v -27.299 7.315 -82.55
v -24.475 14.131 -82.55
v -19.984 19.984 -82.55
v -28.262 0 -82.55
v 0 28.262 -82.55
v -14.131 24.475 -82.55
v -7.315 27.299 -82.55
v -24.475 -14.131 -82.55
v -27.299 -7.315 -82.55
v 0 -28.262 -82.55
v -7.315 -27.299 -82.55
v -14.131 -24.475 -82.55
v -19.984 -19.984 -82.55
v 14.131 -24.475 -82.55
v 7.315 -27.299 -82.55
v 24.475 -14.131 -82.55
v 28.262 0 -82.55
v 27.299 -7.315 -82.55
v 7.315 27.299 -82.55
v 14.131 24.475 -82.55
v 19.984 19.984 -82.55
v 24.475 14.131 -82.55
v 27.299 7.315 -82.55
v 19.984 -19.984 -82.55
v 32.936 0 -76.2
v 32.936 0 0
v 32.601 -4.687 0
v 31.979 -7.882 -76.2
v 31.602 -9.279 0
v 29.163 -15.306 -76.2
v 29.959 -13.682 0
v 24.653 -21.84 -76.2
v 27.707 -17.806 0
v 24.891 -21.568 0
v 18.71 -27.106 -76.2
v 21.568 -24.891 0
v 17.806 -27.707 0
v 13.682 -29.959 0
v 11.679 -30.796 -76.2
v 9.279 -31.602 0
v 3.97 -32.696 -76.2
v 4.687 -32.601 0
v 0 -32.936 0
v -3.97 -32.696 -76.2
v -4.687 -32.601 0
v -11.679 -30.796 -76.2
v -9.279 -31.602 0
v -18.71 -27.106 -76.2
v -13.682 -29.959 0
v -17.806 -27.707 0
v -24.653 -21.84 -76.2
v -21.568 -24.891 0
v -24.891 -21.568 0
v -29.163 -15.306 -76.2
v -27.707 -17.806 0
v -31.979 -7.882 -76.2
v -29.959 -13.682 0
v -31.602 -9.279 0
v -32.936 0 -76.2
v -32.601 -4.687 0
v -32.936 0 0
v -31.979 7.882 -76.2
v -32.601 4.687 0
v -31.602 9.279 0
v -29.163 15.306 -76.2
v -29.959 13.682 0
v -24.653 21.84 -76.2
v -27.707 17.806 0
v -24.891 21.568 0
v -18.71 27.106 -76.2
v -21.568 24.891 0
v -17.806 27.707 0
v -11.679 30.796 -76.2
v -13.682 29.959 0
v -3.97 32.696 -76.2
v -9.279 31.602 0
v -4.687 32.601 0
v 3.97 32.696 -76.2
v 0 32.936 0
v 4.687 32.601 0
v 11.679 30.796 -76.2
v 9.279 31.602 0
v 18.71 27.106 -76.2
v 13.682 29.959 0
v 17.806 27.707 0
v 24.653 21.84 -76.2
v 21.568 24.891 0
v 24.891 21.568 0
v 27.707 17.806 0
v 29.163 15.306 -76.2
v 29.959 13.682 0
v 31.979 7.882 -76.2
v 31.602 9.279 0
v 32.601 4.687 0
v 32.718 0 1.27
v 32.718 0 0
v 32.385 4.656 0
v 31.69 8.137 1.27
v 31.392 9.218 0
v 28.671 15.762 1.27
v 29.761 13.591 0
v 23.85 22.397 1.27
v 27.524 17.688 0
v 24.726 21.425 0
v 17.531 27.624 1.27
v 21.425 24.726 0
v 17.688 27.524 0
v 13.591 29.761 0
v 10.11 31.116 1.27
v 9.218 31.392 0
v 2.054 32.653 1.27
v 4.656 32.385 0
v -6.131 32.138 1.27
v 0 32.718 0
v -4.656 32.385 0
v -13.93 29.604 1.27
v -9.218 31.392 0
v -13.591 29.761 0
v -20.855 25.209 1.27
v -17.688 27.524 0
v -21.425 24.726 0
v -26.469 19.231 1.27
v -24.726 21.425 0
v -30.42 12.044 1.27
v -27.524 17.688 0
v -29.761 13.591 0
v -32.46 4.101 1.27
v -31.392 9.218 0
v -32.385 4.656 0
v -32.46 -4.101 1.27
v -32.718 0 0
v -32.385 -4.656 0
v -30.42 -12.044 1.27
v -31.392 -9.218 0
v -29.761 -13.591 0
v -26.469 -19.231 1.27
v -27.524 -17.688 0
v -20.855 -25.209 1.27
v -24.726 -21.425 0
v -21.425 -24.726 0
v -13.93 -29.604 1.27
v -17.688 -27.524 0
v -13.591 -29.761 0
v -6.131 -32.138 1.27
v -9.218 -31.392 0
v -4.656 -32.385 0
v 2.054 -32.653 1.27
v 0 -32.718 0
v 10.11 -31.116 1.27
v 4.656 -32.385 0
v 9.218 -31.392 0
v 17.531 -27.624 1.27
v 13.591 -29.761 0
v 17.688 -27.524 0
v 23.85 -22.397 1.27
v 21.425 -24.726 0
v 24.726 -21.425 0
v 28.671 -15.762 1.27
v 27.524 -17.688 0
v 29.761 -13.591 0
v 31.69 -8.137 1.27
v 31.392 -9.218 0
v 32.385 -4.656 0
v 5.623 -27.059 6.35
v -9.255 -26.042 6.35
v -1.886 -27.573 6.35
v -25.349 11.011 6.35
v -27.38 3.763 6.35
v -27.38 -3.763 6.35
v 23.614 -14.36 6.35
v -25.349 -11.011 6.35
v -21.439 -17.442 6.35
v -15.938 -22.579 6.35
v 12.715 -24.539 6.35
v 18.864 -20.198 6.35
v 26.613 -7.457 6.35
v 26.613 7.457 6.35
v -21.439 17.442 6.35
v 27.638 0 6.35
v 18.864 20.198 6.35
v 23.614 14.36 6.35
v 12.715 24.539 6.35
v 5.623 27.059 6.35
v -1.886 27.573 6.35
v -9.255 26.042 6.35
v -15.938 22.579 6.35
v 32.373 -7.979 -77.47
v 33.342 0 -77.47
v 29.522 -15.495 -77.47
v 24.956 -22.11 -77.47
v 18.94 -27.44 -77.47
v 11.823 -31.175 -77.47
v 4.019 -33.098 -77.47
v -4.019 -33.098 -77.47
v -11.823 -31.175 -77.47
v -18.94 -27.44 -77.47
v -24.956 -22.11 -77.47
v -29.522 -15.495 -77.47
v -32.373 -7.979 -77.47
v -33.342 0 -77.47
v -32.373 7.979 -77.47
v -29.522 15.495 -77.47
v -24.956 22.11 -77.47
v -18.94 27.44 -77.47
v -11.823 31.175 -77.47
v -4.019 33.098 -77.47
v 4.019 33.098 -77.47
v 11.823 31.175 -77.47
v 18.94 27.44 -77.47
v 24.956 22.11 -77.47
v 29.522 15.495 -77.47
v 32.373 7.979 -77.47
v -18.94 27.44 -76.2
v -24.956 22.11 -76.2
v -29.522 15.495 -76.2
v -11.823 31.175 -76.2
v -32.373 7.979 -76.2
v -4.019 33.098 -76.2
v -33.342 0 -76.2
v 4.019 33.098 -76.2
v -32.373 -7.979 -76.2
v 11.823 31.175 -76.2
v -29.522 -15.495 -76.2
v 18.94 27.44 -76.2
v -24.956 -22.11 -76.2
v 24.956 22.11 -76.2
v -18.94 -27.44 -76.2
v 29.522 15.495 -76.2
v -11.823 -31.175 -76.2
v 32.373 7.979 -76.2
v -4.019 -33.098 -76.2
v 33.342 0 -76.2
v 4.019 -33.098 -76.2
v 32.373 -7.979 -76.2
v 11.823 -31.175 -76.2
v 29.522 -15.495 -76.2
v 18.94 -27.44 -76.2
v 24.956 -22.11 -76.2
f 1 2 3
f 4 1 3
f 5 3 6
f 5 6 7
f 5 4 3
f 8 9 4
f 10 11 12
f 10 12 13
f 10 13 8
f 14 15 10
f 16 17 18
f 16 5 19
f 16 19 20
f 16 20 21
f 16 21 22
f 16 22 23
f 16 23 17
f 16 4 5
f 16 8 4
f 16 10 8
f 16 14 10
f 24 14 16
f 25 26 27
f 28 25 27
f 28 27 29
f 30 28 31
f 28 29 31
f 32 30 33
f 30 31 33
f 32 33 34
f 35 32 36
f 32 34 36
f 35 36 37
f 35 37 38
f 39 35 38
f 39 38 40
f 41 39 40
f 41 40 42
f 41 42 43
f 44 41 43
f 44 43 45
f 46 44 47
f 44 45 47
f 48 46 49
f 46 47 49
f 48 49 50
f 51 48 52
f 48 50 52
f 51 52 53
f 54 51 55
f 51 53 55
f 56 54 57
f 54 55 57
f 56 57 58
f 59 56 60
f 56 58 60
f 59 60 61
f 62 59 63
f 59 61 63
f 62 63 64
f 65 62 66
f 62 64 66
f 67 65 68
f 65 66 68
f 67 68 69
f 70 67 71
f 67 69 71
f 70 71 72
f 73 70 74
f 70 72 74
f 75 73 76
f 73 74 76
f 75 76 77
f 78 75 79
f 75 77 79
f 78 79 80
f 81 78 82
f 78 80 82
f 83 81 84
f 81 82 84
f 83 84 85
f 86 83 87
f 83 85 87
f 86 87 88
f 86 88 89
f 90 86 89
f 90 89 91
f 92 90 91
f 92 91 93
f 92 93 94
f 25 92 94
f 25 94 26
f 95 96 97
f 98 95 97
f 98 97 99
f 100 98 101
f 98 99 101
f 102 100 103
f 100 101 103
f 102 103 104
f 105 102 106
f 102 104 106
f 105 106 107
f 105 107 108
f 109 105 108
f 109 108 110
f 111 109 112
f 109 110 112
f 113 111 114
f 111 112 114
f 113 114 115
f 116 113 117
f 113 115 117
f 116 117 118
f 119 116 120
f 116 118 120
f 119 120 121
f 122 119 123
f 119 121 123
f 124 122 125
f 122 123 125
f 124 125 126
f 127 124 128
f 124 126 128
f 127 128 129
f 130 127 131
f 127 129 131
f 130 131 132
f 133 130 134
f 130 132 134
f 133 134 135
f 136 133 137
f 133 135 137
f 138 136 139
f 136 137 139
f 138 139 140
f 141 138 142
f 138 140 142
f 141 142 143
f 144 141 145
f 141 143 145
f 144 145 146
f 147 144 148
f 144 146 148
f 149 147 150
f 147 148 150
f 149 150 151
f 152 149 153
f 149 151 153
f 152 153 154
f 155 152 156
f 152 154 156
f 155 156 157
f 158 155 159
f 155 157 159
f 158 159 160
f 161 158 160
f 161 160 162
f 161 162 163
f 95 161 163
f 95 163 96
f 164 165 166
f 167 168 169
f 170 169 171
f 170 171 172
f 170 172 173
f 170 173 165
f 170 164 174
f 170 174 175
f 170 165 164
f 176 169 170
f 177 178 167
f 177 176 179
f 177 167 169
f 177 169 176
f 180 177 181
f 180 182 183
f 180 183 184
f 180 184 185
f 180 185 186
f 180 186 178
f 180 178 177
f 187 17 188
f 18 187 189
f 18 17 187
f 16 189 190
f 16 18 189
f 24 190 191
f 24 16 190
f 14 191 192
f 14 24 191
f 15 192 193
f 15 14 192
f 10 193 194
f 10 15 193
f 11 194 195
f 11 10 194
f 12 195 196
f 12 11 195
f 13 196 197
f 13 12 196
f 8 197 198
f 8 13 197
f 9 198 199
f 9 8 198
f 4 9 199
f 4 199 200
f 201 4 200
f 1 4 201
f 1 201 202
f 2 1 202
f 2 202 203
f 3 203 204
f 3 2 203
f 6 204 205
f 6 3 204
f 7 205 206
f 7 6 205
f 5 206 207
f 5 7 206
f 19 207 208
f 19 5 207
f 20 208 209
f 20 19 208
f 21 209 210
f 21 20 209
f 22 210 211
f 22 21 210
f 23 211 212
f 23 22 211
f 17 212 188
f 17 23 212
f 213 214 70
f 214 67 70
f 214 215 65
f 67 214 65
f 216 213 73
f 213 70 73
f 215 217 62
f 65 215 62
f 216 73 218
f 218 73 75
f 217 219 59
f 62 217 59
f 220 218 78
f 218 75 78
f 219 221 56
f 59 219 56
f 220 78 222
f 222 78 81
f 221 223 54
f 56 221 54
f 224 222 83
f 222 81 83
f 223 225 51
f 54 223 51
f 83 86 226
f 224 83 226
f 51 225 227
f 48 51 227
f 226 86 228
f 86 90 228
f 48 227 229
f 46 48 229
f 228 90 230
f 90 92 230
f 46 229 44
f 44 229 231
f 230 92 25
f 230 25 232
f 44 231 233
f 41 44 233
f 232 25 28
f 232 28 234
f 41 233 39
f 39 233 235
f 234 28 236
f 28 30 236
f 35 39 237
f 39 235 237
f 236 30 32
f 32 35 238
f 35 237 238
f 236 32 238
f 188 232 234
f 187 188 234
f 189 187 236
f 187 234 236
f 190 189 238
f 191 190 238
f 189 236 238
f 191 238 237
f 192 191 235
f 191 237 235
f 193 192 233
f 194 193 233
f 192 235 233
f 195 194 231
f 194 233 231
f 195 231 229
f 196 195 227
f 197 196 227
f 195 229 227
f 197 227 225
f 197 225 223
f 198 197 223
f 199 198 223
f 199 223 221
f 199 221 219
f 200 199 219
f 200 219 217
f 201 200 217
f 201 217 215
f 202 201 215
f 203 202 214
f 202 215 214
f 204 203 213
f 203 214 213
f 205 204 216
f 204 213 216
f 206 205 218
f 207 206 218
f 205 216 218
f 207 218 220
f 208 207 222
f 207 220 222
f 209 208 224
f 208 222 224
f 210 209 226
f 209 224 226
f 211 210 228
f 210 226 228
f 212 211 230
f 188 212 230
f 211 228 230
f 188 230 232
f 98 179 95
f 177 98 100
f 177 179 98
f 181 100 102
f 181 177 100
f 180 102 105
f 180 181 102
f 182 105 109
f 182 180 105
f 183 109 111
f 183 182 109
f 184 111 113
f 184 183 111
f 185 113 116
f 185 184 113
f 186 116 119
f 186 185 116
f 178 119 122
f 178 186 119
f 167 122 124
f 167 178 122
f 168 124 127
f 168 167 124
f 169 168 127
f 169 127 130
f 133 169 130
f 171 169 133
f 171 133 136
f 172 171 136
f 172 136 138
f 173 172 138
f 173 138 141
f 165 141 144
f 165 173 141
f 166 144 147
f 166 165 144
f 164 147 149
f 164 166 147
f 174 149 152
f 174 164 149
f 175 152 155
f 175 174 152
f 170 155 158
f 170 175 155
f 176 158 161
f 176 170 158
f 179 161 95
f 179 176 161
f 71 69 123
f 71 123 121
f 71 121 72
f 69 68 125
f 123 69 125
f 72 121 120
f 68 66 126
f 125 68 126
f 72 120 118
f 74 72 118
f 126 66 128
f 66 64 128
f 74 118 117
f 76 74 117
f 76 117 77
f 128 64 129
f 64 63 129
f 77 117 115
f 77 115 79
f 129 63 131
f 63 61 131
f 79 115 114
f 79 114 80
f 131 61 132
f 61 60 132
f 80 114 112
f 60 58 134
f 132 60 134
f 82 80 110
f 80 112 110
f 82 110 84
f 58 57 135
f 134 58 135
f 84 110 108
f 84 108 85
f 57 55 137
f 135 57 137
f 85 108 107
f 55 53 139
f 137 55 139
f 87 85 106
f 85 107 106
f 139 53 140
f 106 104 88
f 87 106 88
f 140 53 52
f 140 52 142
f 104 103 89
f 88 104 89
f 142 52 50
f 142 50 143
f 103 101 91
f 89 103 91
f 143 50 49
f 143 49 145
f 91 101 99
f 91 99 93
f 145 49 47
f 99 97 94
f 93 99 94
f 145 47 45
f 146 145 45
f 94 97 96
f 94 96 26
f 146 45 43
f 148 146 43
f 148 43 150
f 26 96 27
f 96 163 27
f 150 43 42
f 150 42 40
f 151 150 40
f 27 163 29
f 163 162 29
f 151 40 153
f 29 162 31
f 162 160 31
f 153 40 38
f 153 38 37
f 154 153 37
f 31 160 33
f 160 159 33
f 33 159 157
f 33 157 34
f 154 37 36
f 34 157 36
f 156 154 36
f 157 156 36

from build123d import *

# Parameters (mm, degrees)
F0_R     = 32.717526
F1_DEPTH = 6.35
F2_SIZE  = 5.08
F3_R     = 32.935812
F4_DEPTH = 76.2
F5_R     = 33.341524
F6_DEPTH = 6.35
F7_SIZE  = 5.08


with BuildPart() as f1:
    # F0 (on Top) → F1 (new body)
    with BuildSketch(Plane.XY):
        Circle(F0_R)
    extrude(amount=F1_DEPTH)

    # F2
    f2_edges = [f1.edges().sort_by_distance(p)[0] for p in [
        (-32.717526, 0, 6.35),
    ]]
    chamfer(f2_edges, length=F2_SIZE)

    # F3 (on face) → F4 (join)
    with BuildSketch(Plane(origin=(0, 0, 0), x_dir=(1, 0, 0), z_dir=(0, 0, -1))):
        Circle(F3_R)
    extrude(amount=F4_DEPTH)

    # F5 (on face) → F6 (join)
    with BuildSketch(Plane(origin=(0, 0, -76.2), x_dir=(1, 0, 0), z_dir=(0, 0, -1))):
        Circle(F5_R)
    extrude(amount=F6_DEPTH)

    # F7
    f7_edges = [f1.edges().sort_by_distance(p)[0] for p in [
        (-33.341524, 0, -82.55),
    ]]
    chamfer(f7_edges, length=F7_SIZE)


solid = f1.part
